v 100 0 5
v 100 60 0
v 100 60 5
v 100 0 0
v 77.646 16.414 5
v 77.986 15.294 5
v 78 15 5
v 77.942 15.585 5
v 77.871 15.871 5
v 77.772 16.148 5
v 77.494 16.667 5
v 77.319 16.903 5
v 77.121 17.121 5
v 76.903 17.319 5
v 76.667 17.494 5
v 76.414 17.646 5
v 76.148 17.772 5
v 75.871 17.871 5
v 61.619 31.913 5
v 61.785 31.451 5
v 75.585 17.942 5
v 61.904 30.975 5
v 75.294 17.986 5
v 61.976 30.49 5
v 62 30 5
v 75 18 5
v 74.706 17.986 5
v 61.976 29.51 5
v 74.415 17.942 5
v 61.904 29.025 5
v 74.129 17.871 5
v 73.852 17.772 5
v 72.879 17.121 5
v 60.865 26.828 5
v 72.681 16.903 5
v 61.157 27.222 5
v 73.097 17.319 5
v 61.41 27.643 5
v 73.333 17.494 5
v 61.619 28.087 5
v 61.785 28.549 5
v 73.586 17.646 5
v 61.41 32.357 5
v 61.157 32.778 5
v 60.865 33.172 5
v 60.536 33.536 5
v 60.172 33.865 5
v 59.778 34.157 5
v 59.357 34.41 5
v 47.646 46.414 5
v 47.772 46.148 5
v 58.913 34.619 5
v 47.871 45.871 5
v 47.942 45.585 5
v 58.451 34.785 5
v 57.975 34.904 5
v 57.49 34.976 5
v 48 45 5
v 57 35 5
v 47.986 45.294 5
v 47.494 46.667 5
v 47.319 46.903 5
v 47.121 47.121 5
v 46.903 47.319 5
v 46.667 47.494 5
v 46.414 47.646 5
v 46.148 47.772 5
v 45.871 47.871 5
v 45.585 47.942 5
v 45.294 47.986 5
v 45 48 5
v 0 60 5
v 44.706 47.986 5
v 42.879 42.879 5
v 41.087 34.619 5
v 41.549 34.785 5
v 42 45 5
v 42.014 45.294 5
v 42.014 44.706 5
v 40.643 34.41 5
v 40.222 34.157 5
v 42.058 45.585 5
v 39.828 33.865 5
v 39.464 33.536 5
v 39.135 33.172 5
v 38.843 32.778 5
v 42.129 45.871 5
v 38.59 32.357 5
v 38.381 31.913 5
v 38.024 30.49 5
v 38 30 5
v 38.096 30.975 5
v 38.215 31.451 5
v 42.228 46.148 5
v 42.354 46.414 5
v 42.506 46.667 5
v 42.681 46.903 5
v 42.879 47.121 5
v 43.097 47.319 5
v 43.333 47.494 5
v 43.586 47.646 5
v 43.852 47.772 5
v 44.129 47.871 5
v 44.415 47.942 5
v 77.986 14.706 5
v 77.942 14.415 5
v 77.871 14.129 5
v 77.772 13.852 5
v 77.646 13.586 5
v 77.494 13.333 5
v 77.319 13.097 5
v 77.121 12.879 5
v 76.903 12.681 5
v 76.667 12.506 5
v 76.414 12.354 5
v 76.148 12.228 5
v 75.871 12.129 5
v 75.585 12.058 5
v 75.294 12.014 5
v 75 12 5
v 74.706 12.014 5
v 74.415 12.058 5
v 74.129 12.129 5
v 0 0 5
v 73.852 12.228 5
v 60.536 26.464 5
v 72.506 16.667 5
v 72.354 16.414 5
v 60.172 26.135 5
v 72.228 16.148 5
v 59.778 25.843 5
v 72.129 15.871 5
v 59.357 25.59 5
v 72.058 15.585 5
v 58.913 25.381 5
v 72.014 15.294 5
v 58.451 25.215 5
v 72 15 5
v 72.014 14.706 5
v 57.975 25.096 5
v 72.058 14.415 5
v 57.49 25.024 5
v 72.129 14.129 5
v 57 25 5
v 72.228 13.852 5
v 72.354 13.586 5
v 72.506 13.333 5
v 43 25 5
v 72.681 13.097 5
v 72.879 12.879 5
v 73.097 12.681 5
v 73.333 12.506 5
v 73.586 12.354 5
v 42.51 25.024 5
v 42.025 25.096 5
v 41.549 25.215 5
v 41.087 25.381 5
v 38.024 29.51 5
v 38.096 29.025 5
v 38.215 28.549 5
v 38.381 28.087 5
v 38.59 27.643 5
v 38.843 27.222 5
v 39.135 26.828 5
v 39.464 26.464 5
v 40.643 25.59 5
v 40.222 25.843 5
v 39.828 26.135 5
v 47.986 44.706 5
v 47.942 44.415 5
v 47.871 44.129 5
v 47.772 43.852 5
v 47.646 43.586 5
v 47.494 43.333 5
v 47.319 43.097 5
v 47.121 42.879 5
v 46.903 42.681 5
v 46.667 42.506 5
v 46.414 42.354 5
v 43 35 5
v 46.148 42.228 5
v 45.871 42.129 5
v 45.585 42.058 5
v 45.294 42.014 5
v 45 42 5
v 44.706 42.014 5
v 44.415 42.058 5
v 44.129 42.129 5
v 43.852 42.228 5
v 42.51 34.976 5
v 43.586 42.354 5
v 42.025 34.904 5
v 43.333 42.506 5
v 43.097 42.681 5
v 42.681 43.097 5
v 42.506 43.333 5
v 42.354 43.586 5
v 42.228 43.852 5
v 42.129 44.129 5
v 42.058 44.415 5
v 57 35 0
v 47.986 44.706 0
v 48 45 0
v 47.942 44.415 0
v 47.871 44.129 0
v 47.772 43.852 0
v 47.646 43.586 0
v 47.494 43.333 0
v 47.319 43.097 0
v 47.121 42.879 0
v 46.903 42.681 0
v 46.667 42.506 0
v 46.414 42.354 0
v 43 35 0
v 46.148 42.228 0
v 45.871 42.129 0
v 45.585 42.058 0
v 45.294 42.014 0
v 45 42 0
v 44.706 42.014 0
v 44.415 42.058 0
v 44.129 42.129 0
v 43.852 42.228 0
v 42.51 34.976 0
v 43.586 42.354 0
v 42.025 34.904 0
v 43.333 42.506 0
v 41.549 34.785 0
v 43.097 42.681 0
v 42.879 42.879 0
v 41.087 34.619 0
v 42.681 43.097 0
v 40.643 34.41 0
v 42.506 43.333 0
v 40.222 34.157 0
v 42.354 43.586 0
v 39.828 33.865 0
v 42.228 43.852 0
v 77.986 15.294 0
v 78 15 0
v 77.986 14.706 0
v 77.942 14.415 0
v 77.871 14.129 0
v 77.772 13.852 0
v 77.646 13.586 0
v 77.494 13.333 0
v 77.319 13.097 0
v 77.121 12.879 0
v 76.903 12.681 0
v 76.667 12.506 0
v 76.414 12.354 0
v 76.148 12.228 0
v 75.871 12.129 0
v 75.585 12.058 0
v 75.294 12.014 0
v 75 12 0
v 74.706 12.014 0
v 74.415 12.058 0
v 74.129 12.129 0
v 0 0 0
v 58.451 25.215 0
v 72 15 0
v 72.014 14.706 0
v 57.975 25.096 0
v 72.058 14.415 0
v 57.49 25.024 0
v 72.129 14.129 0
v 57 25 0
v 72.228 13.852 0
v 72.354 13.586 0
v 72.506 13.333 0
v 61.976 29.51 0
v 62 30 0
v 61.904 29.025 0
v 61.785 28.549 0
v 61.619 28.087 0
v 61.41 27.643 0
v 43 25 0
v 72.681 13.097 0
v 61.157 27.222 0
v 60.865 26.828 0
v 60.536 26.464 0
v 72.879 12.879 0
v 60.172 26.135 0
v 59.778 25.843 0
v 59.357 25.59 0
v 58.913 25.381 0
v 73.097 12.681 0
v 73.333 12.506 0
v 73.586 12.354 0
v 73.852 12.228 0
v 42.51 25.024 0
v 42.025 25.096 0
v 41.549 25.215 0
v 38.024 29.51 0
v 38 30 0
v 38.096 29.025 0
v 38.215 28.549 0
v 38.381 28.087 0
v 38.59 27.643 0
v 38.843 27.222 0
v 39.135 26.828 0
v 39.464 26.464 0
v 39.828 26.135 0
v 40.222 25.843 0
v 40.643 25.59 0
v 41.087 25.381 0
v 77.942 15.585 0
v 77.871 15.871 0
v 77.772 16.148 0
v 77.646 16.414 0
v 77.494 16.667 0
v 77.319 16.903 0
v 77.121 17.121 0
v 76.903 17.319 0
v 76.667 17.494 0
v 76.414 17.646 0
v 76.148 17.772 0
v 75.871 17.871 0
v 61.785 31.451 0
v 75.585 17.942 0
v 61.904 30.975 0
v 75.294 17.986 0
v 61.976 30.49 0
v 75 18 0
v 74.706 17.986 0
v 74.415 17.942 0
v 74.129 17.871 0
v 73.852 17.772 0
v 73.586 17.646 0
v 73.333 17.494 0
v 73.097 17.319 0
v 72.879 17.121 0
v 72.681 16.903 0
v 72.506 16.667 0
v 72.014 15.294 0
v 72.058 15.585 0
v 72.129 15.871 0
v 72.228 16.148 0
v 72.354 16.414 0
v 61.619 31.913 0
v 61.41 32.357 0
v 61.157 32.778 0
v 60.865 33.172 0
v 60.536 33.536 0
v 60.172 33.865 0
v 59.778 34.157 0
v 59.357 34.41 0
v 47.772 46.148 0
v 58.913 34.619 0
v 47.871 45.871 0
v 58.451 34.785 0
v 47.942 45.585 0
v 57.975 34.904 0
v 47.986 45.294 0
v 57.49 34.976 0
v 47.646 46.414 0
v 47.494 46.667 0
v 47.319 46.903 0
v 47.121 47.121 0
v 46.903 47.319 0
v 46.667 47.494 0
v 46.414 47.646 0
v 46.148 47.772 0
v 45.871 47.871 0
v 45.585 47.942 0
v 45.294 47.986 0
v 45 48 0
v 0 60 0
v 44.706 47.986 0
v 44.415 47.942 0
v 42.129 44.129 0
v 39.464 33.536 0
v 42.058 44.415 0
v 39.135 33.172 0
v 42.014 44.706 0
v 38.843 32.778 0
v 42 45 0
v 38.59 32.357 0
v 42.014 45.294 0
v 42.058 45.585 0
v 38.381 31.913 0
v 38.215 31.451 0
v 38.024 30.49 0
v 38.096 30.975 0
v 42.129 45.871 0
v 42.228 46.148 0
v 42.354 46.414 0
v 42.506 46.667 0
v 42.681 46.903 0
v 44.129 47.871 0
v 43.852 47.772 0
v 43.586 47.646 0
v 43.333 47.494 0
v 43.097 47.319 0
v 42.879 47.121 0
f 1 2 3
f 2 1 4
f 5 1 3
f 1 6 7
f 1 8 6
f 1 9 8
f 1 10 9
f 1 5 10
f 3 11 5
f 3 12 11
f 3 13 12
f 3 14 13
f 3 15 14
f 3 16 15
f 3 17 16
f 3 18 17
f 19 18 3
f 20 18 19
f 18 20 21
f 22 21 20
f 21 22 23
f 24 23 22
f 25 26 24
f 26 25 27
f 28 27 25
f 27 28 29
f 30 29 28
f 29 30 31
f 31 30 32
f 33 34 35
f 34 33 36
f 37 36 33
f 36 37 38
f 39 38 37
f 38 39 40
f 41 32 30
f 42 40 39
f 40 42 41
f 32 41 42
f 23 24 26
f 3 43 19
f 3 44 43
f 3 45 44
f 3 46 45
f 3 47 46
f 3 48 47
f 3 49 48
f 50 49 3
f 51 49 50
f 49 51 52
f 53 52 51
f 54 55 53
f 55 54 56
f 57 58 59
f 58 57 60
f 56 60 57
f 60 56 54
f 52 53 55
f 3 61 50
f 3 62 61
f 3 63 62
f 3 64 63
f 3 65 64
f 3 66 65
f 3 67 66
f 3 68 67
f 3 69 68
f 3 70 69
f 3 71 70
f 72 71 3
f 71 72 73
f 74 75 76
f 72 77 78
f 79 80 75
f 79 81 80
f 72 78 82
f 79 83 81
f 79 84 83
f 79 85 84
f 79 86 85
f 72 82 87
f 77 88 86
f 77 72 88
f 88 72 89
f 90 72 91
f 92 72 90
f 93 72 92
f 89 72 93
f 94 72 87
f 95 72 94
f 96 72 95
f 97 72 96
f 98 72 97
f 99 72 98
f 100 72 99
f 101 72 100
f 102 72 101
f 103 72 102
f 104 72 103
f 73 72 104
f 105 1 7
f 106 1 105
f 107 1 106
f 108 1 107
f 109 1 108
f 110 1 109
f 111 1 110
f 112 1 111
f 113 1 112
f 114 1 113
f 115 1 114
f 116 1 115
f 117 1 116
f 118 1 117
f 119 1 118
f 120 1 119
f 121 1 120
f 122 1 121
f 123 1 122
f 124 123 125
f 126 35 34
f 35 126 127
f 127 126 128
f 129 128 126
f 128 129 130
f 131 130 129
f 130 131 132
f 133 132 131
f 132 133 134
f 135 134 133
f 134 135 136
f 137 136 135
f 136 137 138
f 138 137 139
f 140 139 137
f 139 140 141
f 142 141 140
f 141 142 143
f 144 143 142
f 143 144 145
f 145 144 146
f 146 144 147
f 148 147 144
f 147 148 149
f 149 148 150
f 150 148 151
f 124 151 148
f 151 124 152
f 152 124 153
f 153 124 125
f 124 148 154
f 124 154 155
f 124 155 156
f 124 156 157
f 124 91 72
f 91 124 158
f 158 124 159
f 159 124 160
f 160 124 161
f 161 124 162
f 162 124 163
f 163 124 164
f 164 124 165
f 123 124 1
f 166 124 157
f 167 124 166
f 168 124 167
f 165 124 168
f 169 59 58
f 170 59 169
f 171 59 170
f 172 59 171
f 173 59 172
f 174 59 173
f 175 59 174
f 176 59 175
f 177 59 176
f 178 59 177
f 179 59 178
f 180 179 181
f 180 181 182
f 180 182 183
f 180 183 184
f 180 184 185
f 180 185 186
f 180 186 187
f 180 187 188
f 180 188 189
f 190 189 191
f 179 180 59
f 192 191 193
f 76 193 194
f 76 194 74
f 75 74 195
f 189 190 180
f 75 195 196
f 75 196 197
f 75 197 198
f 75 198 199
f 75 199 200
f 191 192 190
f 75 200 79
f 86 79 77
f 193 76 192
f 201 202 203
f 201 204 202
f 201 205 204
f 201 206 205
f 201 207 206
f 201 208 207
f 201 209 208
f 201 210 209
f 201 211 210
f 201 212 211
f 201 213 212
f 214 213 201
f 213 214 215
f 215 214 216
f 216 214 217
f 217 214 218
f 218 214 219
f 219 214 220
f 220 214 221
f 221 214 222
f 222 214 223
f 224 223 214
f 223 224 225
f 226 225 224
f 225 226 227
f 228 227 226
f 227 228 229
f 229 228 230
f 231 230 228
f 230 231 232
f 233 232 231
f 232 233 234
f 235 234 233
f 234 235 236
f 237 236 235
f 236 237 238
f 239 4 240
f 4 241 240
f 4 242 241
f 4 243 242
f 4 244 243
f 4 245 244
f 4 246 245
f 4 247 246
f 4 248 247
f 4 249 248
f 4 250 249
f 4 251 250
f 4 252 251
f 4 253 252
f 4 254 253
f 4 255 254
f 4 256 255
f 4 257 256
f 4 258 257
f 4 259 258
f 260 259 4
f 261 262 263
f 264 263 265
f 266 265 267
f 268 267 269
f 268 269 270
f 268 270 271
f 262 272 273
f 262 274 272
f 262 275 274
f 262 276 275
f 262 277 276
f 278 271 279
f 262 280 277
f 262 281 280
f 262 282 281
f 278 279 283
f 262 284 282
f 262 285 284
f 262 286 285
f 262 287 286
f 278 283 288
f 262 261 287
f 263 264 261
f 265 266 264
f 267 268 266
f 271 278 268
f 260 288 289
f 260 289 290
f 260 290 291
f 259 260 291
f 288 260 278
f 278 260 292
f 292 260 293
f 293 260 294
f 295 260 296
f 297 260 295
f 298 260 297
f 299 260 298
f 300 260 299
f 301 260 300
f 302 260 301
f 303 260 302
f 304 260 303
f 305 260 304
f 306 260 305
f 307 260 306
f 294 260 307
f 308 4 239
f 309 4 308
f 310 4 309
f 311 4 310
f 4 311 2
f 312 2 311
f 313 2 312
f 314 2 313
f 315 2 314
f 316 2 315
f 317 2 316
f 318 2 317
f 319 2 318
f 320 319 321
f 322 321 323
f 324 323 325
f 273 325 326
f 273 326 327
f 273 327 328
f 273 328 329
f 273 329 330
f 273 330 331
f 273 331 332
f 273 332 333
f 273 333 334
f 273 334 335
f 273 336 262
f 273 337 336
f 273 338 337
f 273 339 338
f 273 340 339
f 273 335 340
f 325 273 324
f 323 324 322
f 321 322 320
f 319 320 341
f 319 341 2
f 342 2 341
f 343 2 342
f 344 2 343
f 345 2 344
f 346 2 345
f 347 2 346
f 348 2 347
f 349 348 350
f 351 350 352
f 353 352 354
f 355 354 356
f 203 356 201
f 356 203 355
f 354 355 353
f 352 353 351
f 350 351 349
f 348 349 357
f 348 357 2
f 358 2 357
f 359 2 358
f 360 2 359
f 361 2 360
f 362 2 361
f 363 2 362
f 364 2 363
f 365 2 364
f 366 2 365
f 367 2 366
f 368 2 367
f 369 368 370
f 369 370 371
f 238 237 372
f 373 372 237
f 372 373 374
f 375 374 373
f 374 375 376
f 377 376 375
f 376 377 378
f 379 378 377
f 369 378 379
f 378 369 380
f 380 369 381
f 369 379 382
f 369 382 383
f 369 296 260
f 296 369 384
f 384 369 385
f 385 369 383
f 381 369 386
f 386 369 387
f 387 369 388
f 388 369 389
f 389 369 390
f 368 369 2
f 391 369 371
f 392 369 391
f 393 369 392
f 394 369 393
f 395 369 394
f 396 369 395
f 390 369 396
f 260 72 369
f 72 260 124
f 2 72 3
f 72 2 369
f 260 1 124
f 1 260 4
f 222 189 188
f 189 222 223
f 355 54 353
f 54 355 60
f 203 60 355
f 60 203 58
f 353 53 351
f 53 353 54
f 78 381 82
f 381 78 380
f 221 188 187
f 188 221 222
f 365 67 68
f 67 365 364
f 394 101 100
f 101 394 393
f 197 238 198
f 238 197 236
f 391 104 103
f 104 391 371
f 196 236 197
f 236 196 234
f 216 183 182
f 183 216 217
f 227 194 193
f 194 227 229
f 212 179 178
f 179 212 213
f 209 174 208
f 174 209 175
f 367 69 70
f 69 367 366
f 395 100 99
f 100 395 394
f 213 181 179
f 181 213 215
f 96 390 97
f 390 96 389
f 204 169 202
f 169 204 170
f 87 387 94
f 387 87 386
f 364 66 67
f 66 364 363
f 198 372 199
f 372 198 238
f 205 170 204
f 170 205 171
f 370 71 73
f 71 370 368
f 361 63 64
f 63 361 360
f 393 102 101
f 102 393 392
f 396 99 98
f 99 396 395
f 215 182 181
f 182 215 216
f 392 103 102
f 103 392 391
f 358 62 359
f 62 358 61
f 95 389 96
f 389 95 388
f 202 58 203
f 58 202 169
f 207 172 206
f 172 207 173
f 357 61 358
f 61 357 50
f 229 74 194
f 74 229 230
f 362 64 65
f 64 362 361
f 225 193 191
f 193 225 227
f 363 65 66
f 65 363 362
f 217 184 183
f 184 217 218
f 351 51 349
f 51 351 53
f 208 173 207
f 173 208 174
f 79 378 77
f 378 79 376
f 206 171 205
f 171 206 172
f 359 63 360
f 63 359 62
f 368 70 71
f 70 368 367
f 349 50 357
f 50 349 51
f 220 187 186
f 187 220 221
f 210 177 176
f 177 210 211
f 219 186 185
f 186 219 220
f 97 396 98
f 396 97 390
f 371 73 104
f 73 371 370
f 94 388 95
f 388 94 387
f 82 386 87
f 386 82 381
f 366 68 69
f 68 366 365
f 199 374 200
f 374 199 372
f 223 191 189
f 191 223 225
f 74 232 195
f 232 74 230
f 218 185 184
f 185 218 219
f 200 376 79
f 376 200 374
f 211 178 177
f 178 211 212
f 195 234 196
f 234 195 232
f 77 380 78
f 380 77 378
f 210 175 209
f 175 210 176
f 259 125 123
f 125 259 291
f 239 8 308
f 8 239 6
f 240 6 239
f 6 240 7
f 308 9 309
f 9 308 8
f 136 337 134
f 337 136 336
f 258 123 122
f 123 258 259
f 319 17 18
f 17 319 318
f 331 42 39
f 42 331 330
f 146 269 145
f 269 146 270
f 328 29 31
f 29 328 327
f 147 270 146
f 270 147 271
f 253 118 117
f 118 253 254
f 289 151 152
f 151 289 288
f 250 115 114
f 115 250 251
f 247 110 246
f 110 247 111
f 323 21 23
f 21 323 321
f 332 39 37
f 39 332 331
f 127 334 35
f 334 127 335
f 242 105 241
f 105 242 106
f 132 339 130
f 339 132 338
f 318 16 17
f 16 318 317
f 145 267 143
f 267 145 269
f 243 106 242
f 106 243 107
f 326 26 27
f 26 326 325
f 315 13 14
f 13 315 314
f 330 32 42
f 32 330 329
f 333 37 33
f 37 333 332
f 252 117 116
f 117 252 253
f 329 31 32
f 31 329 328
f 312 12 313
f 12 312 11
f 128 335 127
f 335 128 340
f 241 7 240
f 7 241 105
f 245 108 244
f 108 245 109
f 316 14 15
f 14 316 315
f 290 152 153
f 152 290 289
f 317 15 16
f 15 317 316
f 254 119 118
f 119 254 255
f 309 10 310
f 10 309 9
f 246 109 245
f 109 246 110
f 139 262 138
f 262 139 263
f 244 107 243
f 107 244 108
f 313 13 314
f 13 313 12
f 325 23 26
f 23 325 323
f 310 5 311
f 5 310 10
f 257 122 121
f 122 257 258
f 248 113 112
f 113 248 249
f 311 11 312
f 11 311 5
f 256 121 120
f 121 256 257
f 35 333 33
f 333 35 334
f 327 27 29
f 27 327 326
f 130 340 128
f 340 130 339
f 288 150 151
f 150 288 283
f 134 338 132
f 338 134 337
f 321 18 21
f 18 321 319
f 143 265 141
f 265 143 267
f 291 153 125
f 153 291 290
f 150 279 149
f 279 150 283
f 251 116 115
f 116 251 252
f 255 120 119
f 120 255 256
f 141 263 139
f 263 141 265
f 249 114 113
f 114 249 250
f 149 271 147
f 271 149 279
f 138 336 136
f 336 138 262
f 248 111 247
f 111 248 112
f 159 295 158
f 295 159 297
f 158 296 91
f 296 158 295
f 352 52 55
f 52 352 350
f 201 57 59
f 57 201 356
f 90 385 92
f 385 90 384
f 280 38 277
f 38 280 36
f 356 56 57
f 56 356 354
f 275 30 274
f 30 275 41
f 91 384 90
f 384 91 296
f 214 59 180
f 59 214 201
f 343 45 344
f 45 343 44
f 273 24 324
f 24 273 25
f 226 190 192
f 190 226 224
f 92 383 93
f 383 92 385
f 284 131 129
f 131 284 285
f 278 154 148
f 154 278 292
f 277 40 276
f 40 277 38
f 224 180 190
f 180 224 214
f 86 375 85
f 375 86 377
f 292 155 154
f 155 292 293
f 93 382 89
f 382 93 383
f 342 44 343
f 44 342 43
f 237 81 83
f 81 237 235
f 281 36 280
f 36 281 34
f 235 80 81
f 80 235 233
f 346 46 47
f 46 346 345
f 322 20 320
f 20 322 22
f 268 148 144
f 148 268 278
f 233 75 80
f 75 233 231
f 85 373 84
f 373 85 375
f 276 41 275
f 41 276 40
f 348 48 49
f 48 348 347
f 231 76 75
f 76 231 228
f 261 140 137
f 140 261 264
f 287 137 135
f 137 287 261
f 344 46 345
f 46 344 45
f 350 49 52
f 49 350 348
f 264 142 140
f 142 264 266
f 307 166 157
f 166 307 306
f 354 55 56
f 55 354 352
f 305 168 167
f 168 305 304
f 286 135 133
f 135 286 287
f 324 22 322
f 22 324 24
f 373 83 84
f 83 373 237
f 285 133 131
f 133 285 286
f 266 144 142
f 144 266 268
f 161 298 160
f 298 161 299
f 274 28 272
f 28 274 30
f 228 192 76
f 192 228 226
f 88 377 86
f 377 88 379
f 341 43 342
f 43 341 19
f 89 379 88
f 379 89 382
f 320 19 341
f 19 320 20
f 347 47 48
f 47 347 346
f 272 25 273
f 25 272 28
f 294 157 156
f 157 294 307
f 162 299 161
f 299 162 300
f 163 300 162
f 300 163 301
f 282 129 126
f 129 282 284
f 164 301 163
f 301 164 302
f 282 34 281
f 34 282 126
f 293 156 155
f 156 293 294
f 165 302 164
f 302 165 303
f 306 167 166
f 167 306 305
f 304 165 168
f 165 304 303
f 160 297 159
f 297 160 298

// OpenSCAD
// fixture D1 (planted defect): one opening MOVED 20 mm on x.
// declared detector: projection position fidelity (feature_position_fidelity)
// must remain stable: build_success, extents, genus, volume
$fn = 64;
difference() {
  cube([100, 60, 5]);
  translate([45, 45, -1]) cylinder(d = 6, h = 7);   // moved from x=25
  translate([75, 15, -1]) cylinder(d = 6, h = 7);
  translate([50, 30, -1])
    linear_extrude(height = 7)
      hull() {
        translate([-(24 - 10) / 2, 0]) circle(d = 10);
        translate([(24 - 10) / 2, 0]) circle(d = 10);
      }
}
